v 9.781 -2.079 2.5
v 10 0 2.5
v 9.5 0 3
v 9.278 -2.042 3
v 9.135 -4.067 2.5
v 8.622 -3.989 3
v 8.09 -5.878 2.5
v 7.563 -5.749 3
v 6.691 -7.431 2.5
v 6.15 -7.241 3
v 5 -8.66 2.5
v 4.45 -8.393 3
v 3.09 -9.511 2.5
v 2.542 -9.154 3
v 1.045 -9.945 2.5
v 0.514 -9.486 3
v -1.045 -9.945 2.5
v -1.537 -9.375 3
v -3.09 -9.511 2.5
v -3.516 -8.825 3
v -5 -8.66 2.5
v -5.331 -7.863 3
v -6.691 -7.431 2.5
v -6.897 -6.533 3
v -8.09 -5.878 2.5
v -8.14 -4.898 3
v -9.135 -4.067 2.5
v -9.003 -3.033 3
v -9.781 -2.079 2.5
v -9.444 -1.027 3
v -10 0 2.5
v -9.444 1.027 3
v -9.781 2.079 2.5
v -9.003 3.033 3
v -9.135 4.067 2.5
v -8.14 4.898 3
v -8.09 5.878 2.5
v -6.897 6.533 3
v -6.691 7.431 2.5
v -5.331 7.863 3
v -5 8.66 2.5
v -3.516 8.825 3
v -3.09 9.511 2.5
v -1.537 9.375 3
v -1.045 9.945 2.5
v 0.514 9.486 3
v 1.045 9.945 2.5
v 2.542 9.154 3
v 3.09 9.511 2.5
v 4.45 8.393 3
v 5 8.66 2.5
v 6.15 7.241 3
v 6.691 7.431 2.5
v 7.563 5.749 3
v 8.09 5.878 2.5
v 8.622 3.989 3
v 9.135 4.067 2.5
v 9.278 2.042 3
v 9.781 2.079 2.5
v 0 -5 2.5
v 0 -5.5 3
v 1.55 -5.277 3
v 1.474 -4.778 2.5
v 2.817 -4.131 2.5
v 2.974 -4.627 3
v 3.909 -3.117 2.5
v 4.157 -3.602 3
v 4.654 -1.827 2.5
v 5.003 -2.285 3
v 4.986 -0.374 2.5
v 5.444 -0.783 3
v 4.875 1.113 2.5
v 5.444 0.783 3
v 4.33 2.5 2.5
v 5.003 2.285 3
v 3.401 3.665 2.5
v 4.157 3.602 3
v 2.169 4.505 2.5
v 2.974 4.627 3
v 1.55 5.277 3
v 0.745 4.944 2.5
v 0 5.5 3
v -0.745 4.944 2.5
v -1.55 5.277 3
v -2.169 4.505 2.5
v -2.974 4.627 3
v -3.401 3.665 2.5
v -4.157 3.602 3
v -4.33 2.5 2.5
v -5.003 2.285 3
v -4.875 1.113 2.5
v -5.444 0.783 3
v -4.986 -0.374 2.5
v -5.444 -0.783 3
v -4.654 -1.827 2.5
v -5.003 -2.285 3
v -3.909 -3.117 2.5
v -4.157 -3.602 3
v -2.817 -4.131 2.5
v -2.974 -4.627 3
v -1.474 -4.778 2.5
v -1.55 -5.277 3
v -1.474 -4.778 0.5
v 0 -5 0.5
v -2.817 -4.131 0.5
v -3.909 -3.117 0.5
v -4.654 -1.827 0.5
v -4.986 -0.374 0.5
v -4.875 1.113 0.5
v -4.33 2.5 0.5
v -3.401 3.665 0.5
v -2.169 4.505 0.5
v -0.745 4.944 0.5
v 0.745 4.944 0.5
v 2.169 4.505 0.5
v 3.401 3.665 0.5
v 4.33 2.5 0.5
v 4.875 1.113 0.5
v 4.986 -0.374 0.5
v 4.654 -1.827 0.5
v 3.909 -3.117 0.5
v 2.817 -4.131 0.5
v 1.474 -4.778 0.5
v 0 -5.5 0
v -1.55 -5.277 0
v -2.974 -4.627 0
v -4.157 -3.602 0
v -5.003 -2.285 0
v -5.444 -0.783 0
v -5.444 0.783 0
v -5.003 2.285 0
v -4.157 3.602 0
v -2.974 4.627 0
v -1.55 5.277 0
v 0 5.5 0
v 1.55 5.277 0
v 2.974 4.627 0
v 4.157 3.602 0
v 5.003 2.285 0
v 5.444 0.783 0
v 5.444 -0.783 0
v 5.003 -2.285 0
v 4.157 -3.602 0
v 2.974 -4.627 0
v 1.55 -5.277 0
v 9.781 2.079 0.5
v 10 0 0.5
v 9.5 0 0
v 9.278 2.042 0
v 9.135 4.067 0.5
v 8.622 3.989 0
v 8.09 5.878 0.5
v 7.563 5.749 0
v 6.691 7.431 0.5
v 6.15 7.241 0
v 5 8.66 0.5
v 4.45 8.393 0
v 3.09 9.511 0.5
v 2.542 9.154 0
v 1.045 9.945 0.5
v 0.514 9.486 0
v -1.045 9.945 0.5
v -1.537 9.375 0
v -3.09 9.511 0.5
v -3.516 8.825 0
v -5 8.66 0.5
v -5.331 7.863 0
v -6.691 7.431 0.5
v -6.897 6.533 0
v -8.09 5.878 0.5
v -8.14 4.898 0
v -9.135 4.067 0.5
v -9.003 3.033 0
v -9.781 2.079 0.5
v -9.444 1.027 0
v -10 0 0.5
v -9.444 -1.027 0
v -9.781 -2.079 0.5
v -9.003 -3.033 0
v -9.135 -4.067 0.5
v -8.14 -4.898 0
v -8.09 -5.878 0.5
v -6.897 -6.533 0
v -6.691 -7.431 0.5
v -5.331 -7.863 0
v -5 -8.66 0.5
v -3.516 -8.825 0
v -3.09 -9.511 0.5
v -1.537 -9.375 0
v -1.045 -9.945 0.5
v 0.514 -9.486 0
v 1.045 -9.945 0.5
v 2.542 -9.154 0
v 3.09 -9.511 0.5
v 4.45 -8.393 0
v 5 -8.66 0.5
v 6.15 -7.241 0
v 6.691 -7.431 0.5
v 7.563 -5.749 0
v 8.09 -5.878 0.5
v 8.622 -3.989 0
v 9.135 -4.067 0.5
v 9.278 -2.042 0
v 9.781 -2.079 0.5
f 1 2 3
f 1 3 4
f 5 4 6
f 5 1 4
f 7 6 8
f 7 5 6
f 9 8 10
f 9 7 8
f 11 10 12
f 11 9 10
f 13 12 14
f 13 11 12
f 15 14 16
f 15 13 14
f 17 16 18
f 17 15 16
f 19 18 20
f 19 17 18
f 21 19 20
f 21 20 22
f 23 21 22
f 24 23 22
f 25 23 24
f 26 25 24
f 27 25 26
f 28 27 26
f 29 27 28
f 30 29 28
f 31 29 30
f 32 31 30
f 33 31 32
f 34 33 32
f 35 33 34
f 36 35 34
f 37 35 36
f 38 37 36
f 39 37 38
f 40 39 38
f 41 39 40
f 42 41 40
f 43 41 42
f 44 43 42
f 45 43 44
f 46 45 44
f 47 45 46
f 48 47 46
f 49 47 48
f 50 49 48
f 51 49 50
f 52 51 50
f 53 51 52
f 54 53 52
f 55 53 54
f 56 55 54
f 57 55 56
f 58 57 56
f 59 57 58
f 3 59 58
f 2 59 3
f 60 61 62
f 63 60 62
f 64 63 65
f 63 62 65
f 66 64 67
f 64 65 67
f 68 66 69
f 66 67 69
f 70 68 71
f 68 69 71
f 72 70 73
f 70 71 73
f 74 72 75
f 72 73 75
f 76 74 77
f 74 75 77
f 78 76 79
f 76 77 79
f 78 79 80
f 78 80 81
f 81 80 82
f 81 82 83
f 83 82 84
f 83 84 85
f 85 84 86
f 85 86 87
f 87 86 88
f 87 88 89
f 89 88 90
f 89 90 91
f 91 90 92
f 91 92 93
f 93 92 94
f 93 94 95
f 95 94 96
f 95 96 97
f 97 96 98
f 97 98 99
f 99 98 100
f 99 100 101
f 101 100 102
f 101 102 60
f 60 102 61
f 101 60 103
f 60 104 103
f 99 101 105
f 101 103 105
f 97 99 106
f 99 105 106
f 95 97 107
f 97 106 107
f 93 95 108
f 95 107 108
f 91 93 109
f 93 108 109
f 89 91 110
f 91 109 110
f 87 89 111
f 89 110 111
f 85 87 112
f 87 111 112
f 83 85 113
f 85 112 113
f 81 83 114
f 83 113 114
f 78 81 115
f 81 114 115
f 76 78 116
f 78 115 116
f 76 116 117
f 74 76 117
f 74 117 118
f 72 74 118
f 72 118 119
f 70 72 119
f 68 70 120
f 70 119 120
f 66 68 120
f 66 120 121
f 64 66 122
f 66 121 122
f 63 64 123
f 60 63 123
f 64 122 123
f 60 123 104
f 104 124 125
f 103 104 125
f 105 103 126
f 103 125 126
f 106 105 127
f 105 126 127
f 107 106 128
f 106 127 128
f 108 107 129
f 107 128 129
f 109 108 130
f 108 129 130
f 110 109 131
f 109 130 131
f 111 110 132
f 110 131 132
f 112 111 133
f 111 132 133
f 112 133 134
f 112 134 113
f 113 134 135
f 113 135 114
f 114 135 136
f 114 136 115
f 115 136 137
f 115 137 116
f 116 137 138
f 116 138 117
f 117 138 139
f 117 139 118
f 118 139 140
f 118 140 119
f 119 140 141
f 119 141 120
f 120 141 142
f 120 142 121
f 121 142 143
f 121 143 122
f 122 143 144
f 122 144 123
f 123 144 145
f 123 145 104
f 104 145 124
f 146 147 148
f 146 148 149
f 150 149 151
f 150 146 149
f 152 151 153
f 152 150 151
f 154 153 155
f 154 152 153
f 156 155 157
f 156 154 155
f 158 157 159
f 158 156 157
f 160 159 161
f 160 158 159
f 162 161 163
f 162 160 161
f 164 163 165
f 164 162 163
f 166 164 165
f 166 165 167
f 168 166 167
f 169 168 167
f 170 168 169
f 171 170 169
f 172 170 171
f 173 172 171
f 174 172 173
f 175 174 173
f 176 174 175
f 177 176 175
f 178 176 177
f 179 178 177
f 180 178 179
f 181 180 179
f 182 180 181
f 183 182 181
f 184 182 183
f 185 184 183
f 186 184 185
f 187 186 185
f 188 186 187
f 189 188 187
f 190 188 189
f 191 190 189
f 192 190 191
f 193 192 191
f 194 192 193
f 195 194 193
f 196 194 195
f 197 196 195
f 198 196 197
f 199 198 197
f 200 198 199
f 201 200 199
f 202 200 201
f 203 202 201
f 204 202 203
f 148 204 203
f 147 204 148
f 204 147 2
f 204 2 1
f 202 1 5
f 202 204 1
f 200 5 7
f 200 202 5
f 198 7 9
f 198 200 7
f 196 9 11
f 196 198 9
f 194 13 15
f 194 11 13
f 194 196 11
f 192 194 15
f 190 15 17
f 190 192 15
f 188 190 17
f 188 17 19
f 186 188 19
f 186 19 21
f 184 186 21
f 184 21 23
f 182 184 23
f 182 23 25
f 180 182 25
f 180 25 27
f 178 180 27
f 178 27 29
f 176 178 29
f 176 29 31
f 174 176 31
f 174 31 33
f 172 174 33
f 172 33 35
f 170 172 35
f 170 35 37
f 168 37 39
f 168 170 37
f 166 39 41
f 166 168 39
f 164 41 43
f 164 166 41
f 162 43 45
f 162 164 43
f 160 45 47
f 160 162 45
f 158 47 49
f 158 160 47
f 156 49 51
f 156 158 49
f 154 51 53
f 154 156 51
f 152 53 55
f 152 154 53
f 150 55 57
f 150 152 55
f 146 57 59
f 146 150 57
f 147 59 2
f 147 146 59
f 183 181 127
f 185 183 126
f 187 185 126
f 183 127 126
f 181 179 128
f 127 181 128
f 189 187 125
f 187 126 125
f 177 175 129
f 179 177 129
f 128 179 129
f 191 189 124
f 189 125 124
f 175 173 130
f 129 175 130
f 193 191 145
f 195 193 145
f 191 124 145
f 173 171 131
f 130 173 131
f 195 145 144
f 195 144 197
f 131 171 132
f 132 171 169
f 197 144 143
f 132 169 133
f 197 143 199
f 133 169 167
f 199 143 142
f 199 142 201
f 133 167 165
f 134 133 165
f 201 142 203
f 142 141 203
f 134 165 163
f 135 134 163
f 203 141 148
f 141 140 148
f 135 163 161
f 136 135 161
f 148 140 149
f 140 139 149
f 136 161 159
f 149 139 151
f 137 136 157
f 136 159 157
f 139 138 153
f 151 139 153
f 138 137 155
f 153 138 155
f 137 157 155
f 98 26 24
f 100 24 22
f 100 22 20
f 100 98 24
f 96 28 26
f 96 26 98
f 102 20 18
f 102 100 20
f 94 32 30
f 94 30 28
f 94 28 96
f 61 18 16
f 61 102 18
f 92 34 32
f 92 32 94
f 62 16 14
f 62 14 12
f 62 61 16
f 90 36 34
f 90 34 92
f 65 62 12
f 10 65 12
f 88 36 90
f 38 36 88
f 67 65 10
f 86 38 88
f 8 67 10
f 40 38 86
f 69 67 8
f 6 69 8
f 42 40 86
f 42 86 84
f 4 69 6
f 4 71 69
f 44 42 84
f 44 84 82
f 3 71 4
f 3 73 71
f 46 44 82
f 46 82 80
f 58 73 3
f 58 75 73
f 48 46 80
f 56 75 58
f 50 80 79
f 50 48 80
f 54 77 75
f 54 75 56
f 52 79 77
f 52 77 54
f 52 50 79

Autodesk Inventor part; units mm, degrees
ref_plane "YZ Plane" through (0, 0, 0) normal (1, 0, 0) x (0, 1, 0)
ref_plane "XZ Plane" through (0, 0, 0) normal (0, 1, 0) x (-1, 0, 0)
ref_plane "XY Plane" through (0, 0, 0) normal (0, 0, 1) x (1, 0, 0)
sketch "スケッチ1" plane through (0, 0, 0) normal (0, 0, 1) x (1, 0, 0)
  circle A0 centre (0, 0) radius 10
  dimension "d0" = 20
extrude "押し出し1" add sketch "スケッチ1" along normal blind 3
sketch "スケッチ2" plane through (0, 0, 3) normal (0, 0, 1) x (1, 0, 0)
  circle A0 centre (0, 0) radius 10 projected
hole "穴1" at (0, 0, 3) direction (0, 0, -1) diameter 10 end through all
chamfer "面取り1" distance 0.5 angle 45 4 edges at (-10, 0, 3) (-10, 0, 0) (0, 5, 3) (0, 5, 0)
properties part number "WSSM20-10-3" material "MISUMI"
